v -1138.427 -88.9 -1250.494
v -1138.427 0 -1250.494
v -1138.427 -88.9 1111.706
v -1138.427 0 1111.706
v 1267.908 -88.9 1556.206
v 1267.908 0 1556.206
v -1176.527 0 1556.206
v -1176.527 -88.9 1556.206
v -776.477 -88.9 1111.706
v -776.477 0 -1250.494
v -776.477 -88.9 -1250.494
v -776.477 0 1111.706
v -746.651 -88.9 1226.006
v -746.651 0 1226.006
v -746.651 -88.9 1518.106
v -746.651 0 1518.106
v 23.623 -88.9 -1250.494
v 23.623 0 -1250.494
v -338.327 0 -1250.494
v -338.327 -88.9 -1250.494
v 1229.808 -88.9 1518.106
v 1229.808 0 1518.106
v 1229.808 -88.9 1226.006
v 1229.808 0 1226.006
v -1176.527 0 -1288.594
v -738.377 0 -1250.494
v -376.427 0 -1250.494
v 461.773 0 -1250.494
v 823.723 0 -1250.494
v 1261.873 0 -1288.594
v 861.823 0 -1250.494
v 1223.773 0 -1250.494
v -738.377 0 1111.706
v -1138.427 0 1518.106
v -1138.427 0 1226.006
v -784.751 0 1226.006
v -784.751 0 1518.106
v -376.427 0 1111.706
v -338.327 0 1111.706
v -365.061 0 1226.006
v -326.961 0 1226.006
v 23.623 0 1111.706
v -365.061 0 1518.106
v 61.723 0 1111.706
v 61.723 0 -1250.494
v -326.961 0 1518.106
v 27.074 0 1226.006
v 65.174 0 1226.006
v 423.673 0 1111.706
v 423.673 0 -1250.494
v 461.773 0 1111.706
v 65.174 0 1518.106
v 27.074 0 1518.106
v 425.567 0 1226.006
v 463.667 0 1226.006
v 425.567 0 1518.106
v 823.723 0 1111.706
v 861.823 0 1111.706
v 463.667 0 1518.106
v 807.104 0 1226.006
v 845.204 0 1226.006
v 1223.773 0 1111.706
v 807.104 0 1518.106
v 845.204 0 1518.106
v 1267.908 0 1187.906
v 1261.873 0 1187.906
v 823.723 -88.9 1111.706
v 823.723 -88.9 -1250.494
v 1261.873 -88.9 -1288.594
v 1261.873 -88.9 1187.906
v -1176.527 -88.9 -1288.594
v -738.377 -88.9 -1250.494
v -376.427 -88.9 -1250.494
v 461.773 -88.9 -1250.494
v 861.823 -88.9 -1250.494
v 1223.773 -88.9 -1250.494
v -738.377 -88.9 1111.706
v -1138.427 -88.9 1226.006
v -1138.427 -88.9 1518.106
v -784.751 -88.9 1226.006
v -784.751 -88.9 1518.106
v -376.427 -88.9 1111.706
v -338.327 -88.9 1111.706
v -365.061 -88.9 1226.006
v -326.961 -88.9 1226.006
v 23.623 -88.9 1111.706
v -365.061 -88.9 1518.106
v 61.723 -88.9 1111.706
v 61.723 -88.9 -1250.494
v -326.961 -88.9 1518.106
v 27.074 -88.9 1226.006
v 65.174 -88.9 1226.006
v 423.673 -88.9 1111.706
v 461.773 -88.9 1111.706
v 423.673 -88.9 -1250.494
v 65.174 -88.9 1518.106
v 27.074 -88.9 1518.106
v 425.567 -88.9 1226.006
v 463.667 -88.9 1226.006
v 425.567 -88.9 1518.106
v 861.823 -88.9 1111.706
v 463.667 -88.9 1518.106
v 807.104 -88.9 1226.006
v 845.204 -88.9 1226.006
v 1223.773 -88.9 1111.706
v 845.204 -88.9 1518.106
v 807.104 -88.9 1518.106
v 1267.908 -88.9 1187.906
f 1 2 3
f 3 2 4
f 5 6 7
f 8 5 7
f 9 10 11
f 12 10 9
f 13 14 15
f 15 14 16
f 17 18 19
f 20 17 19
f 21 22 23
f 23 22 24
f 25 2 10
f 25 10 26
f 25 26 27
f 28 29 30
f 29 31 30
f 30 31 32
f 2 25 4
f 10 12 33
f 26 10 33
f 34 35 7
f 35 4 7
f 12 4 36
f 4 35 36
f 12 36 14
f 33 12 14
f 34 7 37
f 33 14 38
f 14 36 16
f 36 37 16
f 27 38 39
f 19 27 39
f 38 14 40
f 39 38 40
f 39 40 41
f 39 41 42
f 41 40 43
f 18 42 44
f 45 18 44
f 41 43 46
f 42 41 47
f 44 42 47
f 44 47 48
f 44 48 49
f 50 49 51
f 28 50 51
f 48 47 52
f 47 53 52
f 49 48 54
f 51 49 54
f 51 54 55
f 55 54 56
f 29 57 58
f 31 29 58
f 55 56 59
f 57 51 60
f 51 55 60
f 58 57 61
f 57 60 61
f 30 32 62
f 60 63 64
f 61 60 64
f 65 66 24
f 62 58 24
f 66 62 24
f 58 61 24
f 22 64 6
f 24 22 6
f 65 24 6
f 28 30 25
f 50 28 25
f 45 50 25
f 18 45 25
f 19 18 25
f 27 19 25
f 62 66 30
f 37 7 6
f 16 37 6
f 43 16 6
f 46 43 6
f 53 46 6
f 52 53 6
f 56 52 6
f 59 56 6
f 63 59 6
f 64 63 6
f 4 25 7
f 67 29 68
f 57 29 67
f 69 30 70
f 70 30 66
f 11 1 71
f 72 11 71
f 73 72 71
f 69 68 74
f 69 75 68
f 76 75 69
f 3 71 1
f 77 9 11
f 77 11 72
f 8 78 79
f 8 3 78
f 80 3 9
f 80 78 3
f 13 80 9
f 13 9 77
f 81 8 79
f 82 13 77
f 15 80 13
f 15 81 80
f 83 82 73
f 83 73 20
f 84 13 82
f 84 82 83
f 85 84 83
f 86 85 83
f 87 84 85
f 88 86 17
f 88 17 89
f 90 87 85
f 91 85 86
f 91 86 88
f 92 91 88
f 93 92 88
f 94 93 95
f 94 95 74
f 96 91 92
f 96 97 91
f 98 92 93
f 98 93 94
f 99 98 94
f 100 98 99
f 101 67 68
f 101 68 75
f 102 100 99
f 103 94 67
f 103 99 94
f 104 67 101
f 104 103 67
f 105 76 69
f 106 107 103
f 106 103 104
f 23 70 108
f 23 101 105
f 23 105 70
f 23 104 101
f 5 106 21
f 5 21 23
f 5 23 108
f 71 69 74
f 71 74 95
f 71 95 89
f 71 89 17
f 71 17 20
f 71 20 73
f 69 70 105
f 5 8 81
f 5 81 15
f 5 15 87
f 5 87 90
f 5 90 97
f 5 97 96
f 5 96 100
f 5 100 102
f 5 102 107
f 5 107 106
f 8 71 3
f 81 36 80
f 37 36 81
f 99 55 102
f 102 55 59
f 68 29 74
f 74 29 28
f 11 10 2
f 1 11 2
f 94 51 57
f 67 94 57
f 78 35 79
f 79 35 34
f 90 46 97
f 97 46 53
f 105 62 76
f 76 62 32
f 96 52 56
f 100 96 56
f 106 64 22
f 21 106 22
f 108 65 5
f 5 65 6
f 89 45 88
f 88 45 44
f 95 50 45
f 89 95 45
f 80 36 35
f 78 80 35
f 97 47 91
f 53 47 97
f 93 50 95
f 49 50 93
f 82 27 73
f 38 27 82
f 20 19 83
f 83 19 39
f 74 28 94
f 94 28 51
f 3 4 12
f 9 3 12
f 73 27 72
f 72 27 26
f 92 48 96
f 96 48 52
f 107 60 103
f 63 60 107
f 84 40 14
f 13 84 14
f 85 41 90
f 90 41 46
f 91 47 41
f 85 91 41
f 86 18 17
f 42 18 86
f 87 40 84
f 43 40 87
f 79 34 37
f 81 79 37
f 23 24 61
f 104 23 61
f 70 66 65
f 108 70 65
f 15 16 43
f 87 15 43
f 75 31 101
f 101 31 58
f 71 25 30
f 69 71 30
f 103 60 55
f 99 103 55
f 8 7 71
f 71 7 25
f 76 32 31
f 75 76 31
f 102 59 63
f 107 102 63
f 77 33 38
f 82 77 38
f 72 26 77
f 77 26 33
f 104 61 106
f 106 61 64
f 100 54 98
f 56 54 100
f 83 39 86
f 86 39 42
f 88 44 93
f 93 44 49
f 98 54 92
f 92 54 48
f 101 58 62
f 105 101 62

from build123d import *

# Parameters (mm, degrees)
F0_W     = 2438.4
F0_H     = 2438.4
F0_W_2   = 38.1
F0_H_2   = 292.1
F0_H_3   = 2362.2
F0_H_4   = 38.1
F1_DEPTH = 88.9


# Not quite as in the source:
# - a feature names something its author has since deleted; it is built from what else it names


with BuildPart() as f1:
    # F0 (on Front) → F1 (new body)
    with BuildSketch(Plane.XZ):
        with Locations((42.6727382223, -69.3937962841)):
            Rectangle(F0_W, F0_H)
        Polygon((-1138.4272617777, -1250.4937962841), (-1138.4272617777, 1111.7062037159), (-776.4772617777, 1111.7062037159), (-738.3772617777, 1111.7062037159), (-376.4272617777, 1111.7062037159), (-338.3272617777, 1111.7062037159), (23.6227382223, 1111.7062037159), (61.7227382223, 1111.7062037159), (423.6727382223, 1111.7062037159), (461.7727382223, 1111.7062037159), (823.7227382223, 1111.7062037159), (861.8227382223, 1111.7062037159), (1175.4527852575, 1111.7062037159), (1223.7727382223, 1111.7062037159), (1223.7727382223, -1250.4937962841), (861.8227382223, -1250.4937962841), (823.7227382223, -1250.4937962841), (461.7727382223, -1250.4937962841), (423.6727382223, -1250.4937962841), (61.7227382223, -1250.4937962841), (23.6227382223, -1250.4937962841), (-338.3272617777, -1250.4937962841), (-376.4272617777, -1250.4937962841), (-738.3772617777, -1250.4937962841), (-776.4772617777, -1250.4937962841), align=None, mode=Mode.SUBTRACT)
        Polygon((-1176.5272617777, 1556.2062037159), (-1176.5272617777, 1187.9062037159), (1261.8727382223, 1187.9062037159), (1267.9077571224, 1187.9062037159), (1267.9077571224, 1556.2062037159), align=None)
        Polygon((-1138.4272617777, 1226.0062037159), (-1138.4272617777, 1518.1062037159), (-784.7508192062, 1518.1062037159), (-746.6508192062, 1518.1062037159), (-365.0607764721, 1518.1062037159), (-326.9607764721, 1518.1062037159), (27.0738322288, 1518.1062037159), (65.1738322288, 1518.1062037159), (425.5673885345, 1518.1062037159), (463.6673885345, 1518.1062037159), (807.1037530899, 1518.1062037159), (845.2037530899, 1518.1062037159), (1229.8077571224, 1518.1062037159), (1229.8077571224, 1226.0062037159), (845.2037530899, 1226.0062037159), (807.1037530899, 1226.0062037159), (463.6673885345, 1226.0062037159), (425.5673885345, 1226.0062037159), (65.1738322288, 1226.0062037159), (27.0738322288, 1226.0062037159), (-326.9607764721, 1226.0062037159), (-365.0607764721, 1226.0062037159), (-746.6508192062, 1226.0062037159), (-784.7508192062, 1226.0062037159), align=None, mode=Mode.SUBTRACT)
        with Locations((-765.7008192062, 1372.0562037159)):
            Rectangle(F0_W_2, F0_H_2)
        with Locations((442.7227382223, -69.3937962841)):
            Rectangle(F0_W_2, F0_H_3)
        with Locations((842.7727382223, -69.3937962841)):
            Rectangle(F0_W_2, F0_H_3)
        with Locations((42.6727382223, 1168.8562037159)):
            Rectangle(F0_W, F0_H_4)
        with Locations((-346.0107764721, 1372.0562037159)):
            Rectangle(F0_W_2, F0_H_2)
        with Locations((-357.3772617777, -69.3937962841)):
            Rectangle(F0_W_2, F0_H_3)
        with Locations((42.6727382223, -69.3937962841)):
            Rectangle(F0_W_2, F0_H_3)
        with Locations((46.1238322288, 1372.0562037159)):
            Rectangle(F0_W_2, F0_H_2)
        with Locations((-757.4272617777, -69.3937962841)):
            Rectangle(F0_W_2, F0_H_3)
        with Locations((444.6173885345, 1372.0562037159)):
            Rectangle(F0_W_2, F0_H_2)
        with Locations((826.1537530899, 1372.0562037159)):
            Rectangle(F0_W_2, F0_H_2)
    extrude(amount=F1_DEPTH)


solid = f1.part
